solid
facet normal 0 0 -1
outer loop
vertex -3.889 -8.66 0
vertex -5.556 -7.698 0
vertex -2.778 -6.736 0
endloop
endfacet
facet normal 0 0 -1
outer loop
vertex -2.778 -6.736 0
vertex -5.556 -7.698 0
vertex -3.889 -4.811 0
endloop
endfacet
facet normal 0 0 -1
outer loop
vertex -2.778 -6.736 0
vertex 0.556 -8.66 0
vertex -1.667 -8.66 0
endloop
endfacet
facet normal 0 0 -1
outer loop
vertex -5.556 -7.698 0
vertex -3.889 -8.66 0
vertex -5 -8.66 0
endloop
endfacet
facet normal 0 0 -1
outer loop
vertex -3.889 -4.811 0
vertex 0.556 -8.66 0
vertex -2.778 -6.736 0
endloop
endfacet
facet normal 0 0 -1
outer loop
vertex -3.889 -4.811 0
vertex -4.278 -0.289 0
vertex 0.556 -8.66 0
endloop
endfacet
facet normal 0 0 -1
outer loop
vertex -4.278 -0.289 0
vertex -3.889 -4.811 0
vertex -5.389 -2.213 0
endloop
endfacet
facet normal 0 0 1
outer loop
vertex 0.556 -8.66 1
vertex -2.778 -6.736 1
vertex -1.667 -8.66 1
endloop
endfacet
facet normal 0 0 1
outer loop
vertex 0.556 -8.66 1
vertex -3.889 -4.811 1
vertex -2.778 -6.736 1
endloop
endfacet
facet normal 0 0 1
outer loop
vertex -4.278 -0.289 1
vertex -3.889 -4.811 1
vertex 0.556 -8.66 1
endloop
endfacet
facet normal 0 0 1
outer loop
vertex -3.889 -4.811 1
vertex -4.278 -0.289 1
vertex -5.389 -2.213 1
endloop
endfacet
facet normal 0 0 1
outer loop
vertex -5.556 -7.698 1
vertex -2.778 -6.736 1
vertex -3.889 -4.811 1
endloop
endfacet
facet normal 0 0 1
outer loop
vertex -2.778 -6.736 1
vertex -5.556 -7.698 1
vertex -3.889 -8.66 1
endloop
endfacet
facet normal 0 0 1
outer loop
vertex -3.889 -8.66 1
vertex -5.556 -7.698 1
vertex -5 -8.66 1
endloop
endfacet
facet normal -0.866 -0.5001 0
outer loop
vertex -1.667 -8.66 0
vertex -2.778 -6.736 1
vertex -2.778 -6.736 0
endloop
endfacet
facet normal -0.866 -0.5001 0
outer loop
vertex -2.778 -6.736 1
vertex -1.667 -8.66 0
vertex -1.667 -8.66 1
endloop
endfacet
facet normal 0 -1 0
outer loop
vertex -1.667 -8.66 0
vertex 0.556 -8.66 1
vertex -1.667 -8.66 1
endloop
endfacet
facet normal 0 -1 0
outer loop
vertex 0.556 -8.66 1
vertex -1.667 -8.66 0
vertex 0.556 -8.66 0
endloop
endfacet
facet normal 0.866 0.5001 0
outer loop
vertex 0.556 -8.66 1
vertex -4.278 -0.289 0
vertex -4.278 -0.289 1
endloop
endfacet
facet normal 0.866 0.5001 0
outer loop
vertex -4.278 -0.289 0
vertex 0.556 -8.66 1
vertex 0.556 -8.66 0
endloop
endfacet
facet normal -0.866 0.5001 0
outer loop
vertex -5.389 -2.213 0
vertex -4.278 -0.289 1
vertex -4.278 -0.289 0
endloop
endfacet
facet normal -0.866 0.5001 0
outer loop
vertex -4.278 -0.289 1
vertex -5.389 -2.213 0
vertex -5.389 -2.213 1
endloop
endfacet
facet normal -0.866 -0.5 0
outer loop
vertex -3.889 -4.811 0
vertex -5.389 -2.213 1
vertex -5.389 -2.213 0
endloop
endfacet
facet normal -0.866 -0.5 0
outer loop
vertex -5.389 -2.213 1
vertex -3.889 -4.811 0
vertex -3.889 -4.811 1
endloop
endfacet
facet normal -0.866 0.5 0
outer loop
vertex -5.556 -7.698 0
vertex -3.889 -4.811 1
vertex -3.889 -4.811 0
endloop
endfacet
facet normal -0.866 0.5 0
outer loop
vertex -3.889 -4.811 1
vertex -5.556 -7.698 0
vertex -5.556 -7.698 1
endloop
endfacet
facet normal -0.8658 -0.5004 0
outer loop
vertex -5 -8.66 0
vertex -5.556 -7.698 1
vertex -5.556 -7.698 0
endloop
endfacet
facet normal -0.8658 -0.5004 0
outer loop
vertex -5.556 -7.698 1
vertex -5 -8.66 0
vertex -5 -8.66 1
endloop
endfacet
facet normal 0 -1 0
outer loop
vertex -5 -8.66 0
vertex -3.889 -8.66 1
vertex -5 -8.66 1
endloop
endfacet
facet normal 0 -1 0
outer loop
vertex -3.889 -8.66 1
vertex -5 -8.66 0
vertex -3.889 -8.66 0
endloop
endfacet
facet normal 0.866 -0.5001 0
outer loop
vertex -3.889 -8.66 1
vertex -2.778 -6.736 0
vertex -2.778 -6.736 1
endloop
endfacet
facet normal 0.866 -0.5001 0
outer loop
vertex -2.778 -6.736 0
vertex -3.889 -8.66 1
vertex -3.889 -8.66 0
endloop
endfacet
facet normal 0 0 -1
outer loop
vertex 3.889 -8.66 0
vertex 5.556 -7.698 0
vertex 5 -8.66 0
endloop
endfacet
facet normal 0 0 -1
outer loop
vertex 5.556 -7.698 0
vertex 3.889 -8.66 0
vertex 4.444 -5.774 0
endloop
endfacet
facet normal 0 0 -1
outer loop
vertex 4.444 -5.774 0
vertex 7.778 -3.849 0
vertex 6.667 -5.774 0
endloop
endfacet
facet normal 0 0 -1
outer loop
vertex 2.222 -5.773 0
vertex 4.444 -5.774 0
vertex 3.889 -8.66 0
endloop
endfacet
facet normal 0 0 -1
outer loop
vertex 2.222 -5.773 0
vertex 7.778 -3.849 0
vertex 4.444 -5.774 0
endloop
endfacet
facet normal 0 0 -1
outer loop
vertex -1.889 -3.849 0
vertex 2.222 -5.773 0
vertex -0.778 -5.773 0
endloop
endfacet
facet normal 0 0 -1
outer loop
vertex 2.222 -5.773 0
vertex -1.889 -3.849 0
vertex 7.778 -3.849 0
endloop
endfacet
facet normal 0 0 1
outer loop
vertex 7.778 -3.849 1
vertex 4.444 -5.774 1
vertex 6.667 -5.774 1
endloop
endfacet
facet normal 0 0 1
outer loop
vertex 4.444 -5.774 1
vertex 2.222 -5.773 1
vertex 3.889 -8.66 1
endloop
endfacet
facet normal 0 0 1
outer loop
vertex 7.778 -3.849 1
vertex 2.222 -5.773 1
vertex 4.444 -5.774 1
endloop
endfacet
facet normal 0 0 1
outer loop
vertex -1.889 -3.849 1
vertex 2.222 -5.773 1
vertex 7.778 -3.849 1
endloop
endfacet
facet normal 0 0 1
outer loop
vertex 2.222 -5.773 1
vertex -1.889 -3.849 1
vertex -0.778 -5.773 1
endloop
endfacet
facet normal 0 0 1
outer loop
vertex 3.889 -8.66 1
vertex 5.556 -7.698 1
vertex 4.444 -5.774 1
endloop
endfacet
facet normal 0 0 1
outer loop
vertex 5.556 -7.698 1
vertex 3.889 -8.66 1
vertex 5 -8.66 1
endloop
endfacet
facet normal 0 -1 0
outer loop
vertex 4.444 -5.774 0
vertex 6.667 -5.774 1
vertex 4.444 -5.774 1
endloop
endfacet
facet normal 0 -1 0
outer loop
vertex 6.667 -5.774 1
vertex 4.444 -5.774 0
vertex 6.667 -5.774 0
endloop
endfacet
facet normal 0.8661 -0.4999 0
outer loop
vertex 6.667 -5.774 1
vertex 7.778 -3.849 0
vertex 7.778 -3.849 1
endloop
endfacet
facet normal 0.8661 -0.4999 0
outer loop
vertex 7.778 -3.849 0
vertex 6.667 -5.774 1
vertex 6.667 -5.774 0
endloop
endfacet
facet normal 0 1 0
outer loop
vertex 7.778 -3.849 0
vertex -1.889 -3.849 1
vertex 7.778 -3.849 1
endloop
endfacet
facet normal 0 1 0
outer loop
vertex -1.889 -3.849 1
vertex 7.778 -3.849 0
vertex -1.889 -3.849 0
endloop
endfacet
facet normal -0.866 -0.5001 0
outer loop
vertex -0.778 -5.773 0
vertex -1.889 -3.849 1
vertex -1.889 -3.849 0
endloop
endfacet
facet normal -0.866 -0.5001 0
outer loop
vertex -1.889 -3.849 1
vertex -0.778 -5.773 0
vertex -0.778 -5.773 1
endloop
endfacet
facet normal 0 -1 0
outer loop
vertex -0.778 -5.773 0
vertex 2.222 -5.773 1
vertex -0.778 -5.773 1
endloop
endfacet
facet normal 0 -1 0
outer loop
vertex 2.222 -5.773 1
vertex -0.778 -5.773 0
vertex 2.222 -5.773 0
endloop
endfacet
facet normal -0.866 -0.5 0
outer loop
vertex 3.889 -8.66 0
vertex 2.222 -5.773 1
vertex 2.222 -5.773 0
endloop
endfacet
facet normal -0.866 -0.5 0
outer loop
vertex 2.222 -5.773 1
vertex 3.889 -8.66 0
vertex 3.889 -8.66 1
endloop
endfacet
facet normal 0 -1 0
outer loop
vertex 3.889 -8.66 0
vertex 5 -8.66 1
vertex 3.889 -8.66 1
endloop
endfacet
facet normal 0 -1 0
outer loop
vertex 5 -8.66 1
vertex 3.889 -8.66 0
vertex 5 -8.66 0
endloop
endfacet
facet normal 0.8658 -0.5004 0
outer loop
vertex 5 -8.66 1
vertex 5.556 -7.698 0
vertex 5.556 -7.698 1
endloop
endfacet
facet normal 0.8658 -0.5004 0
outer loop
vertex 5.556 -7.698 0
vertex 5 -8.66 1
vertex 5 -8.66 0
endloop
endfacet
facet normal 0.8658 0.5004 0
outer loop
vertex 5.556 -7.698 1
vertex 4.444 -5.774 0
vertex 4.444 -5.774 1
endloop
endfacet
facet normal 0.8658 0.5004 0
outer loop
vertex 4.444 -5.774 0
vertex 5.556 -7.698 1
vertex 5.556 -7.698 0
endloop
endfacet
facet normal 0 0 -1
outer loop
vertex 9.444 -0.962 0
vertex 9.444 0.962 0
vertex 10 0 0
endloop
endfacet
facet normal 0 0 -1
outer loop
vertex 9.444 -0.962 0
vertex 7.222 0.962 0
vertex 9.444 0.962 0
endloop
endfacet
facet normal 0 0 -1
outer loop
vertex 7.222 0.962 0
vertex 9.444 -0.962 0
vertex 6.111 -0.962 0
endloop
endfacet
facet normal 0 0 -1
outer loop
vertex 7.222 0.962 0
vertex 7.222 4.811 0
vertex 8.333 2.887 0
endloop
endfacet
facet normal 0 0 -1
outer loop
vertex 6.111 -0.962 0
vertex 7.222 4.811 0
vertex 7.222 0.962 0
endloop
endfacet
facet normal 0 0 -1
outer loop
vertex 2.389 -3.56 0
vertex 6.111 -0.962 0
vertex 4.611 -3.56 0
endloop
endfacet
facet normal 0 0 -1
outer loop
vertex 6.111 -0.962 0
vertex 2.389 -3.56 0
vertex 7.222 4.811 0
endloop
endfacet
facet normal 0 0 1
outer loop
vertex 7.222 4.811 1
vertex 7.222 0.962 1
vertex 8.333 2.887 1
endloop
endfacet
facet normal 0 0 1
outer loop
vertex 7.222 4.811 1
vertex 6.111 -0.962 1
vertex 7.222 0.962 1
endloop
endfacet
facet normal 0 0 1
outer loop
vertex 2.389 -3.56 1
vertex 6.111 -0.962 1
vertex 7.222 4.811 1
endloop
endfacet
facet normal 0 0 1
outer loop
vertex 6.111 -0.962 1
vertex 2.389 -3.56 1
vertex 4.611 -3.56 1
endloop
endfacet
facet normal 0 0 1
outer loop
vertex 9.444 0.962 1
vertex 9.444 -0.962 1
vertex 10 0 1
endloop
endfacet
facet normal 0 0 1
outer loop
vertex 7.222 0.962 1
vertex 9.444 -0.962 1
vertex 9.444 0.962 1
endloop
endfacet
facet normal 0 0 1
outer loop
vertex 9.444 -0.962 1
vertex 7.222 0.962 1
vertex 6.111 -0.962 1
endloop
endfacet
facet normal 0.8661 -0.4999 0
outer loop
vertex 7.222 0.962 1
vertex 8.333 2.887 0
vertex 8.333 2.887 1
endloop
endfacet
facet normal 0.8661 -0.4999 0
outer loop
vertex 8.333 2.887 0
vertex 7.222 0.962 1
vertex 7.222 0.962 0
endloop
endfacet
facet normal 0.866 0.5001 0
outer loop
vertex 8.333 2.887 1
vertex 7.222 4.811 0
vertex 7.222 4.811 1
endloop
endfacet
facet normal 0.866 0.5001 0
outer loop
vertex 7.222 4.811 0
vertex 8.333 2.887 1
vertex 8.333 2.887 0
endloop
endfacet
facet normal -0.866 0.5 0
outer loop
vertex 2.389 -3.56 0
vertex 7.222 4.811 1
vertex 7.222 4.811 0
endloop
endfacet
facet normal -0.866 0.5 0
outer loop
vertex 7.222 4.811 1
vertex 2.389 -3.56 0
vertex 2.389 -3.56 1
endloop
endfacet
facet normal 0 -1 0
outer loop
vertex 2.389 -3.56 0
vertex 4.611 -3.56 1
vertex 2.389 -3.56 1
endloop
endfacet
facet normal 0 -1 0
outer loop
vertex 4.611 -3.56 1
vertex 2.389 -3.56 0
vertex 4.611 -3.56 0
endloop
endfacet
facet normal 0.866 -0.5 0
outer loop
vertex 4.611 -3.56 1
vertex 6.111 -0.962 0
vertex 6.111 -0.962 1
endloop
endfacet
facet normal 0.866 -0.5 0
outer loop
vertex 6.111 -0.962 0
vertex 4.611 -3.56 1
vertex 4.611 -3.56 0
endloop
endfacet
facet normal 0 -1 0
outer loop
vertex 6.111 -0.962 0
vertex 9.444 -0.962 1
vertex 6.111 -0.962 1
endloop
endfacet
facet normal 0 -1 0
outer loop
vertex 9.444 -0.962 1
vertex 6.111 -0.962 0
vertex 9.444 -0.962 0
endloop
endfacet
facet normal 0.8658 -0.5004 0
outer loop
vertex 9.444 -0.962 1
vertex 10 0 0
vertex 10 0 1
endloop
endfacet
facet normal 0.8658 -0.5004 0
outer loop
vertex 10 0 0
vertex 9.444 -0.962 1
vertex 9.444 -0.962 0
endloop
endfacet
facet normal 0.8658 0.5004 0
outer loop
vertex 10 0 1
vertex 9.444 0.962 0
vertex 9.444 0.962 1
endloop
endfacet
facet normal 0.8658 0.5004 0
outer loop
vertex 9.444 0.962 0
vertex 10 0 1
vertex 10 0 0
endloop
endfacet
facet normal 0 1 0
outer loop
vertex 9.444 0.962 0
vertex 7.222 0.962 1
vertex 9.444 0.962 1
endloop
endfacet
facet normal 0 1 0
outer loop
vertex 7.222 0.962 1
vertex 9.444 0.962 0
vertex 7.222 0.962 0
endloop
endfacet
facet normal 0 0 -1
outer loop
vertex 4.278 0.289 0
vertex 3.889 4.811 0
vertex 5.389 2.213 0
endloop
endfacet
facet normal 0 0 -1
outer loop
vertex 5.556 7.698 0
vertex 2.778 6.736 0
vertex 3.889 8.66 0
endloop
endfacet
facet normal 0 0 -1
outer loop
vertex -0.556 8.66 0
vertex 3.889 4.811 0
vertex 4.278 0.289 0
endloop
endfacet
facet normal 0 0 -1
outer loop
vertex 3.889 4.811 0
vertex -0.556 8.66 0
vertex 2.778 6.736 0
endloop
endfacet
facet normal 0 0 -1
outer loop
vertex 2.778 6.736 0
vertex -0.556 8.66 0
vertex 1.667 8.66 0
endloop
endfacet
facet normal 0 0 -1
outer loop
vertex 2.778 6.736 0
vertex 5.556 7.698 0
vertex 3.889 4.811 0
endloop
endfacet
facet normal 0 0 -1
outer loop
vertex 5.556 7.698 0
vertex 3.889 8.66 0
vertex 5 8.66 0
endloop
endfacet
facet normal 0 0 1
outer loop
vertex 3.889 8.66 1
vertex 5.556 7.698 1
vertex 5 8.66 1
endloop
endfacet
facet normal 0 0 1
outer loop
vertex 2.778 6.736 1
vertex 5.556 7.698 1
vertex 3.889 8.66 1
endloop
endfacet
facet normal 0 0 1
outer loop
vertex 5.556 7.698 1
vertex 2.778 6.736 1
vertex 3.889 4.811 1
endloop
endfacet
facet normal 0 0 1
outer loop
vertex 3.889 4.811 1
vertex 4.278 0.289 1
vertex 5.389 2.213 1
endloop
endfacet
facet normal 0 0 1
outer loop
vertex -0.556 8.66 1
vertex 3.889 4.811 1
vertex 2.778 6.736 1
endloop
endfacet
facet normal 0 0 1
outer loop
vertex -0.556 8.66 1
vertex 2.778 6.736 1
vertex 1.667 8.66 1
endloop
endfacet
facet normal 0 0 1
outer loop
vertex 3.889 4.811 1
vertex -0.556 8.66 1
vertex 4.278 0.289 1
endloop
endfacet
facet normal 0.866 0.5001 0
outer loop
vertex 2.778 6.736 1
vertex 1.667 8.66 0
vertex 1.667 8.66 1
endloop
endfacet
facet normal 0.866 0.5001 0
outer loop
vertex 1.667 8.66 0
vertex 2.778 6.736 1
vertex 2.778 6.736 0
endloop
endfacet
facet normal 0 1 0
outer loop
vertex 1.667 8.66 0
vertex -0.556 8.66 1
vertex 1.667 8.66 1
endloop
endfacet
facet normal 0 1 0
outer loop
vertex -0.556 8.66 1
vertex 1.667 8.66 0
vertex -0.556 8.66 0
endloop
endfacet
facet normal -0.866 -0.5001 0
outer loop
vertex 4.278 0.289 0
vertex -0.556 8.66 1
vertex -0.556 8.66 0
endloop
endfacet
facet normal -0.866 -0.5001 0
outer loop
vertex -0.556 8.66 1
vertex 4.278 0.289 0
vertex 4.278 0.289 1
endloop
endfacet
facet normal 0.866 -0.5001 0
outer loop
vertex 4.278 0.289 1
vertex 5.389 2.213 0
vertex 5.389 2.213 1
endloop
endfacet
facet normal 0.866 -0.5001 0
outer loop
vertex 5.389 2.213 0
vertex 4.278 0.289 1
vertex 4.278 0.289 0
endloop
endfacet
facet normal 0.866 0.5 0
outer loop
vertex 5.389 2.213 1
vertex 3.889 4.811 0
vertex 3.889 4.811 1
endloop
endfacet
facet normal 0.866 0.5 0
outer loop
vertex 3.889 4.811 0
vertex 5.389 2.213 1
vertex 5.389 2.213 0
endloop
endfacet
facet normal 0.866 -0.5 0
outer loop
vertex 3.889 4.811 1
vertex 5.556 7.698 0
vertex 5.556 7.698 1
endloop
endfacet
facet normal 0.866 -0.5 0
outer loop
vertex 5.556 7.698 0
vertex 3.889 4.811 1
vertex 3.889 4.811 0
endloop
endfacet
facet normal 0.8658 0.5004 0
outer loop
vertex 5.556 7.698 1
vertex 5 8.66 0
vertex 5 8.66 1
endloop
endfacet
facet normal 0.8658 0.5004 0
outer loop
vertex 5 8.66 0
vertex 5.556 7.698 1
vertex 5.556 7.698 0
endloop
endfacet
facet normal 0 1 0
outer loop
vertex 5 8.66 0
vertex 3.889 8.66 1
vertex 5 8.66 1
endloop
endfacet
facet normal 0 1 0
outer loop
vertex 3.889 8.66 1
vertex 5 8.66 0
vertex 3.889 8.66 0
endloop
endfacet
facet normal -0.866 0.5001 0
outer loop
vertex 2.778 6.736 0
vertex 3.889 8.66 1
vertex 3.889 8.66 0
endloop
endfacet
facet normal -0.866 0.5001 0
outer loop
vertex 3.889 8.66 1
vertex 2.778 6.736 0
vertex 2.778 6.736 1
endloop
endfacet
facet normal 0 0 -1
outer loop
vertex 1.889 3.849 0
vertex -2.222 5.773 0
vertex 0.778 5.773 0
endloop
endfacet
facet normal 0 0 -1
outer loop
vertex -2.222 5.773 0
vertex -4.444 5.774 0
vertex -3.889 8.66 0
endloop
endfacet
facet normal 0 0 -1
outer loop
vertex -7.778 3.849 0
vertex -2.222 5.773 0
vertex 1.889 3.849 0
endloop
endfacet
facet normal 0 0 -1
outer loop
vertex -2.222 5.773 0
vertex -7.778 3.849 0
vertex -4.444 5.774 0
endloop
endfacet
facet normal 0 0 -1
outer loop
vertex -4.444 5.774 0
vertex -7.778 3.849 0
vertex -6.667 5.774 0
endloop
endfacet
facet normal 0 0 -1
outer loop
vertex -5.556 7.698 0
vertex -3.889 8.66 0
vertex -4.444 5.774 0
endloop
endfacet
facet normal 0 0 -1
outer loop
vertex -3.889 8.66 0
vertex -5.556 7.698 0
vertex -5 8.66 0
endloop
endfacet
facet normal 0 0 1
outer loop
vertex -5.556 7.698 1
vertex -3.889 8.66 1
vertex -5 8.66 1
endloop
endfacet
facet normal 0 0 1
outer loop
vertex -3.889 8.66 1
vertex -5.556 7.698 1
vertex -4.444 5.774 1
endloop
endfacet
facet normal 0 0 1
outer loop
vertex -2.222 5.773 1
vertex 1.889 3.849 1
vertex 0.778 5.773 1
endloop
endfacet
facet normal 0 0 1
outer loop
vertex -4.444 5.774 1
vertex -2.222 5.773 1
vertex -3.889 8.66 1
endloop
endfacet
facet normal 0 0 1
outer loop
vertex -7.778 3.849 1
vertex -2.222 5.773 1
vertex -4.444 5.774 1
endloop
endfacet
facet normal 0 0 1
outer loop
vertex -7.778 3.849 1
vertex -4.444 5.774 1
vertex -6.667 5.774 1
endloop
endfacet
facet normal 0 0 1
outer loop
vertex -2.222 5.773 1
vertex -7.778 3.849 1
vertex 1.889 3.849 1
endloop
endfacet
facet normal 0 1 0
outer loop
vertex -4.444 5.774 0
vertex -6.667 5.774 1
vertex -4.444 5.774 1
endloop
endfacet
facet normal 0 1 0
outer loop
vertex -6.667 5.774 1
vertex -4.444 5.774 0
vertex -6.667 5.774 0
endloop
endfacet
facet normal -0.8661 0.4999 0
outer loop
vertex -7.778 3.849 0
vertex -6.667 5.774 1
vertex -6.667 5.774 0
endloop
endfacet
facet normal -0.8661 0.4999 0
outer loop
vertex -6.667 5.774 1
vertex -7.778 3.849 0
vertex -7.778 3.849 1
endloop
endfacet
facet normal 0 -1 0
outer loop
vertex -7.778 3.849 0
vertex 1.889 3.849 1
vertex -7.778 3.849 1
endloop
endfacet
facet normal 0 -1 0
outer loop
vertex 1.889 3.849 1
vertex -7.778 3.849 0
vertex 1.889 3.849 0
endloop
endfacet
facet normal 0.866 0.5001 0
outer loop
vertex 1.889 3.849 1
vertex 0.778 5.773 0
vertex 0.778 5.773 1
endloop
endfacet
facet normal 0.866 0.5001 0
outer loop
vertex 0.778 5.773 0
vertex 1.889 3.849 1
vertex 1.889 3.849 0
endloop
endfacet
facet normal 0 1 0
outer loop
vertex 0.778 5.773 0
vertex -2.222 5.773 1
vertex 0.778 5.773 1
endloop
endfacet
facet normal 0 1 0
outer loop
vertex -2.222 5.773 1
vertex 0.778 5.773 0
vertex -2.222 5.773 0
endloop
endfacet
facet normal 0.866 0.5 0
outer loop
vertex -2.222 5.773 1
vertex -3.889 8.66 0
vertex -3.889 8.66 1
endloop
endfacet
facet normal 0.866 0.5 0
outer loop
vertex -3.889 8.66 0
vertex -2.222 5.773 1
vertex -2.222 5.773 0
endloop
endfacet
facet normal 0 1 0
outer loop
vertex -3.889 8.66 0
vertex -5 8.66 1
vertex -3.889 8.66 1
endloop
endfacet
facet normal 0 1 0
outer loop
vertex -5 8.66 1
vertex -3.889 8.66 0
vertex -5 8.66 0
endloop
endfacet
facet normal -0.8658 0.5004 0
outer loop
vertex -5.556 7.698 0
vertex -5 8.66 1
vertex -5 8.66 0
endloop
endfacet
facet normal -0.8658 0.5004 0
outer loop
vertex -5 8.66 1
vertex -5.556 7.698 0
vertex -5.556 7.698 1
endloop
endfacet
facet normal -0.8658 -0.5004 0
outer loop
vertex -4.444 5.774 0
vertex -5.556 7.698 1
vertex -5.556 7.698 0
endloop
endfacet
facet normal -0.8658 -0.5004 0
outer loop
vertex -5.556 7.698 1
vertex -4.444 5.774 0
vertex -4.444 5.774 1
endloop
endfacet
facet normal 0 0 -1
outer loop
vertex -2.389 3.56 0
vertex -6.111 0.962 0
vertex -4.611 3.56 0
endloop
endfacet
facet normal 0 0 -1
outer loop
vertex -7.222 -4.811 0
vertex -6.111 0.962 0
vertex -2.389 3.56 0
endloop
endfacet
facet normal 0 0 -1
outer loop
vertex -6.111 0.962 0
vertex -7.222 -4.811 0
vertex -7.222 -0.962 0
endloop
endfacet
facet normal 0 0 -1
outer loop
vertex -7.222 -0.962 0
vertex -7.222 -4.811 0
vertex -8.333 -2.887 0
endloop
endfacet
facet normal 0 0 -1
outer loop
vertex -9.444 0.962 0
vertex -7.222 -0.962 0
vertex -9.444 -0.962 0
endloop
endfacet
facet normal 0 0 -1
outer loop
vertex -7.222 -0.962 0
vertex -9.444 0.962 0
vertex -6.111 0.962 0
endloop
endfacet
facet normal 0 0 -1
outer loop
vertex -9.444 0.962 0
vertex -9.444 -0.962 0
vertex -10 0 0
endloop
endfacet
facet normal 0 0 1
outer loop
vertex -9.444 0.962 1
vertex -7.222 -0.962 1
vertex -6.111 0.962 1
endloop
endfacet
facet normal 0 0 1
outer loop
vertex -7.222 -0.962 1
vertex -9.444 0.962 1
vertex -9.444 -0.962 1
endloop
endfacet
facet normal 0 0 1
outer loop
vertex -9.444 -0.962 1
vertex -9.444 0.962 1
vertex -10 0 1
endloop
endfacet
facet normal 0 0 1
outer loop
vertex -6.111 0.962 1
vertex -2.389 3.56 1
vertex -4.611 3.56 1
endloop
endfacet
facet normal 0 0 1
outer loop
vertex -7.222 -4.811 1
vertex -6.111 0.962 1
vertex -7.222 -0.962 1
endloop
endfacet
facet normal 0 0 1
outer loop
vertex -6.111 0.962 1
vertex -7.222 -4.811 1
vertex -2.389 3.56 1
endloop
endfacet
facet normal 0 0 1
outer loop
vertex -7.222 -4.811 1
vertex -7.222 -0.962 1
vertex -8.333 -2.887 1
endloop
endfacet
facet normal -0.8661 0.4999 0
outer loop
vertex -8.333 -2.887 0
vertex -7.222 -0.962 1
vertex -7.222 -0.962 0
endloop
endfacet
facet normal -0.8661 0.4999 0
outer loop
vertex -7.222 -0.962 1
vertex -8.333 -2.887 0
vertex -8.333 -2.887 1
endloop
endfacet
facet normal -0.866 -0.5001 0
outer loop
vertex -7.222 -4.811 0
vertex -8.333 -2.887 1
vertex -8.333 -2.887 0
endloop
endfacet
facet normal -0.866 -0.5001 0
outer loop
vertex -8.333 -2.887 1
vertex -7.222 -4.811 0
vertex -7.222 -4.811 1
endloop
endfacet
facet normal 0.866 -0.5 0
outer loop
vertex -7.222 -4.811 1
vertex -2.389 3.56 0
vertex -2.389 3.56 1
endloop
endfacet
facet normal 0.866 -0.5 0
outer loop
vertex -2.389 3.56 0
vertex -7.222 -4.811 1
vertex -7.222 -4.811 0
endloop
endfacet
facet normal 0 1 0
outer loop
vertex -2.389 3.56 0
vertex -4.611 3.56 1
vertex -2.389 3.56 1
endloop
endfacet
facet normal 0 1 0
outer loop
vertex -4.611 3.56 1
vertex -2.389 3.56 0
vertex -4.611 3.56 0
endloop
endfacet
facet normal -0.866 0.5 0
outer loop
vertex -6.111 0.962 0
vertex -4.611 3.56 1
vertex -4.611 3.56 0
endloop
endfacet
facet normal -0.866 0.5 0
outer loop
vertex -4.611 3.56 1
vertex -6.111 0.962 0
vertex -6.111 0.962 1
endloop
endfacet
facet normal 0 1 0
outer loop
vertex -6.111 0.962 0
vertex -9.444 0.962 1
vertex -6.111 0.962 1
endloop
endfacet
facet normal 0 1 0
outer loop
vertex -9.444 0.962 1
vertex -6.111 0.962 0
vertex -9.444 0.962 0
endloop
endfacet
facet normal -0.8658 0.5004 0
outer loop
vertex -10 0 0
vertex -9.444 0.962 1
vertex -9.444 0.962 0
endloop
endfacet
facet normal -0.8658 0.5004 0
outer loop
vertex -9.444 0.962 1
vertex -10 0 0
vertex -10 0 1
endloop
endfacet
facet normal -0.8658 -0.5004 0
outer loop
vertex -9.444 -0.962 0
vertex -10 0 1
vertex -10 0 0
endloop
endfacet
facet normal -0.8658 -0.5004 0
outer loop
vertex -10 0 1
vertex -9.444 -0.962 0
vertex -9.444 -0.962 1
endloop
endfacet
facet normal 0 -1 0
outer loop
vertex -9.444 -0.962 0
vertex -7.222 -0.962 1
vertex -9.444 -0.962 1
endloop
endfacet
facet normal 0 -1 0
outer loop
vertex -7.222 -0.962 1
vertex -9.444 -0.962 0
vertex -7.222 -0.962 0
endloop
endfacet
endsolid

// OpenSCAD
// file: parametric-flake.scad
unit = [1, 0];
origin = [0, 0];


/*
    Returns a 2D rotation matrix given an angle.
*/
function rot2d(angle) = [
    [+cos(angle), -sin(angle)],
    [+sin(angle), +cos(angle)]
];


/*
    Calculates the points for a hexagon.
    Used to reference off of for creating the lambda.
    Points are created starting from the right and moving counter-clockwise.

         2   1

      3         0

         4   5
*/
function inner_hex_points(data) = [
    for (angle = [0 : 60 : 300]) 
    dict_get(data, "scale") * rot2d(angle) * unit
];



/*
    Calculates the points for making a lambda.
*/
function lambda_points(data) =
let (
    hex_points = inner_hex_points(data),
    thickness = dict_get(data, "thickness") / 2,
    top_left = hex_points[2],
    bottom_left = hex_points[4],
    bottom_right = hex_points[5],
    v_0 = thickness * unit,
    v_p60 = thickness * rot2d(60) * unit,
    v_n60 = thickness * rot2d(-60) * unit,
    v_n90 = thickness * rot2d(-90) * unit,
    gap = dict_get(data, "gap") * rot2d(-60) * unit
)
[
    [
        top_left + v_p60,
    ],
    [
        top_left - v_p60 + gap,
        top_left + v_p60 + gap,
        bottom_right + v_0,
        bottom_right - v_0,
        sqrt(3) * v_n90,
        bottom_left + v_0,
        bottom_left,
        bottom_left - v_n60,
        -v_0
    ]
];


/*
    Generates a single lambda at the origin.
*/
module lambda(data) {
    new_data = update_params(data);
    linear_extrude(dict_get(new_data, "height"))
    polygon(lambda_points(new_data)[1]);
}


/*
    Generates a NixOS flake.
*/
module flake(data) {
    new_data = update_params(data);
    for (idx = [0 : 5]) {
        rotate([0, 0, idx * 60]) 
        translate(-lambda_points(new_data)[0][0])
        translate([-dict_get(new_data, "scale"), 0, 0])
        linear_extrude(dict_get(new_data, "height"))
        polygon(lambda_points(new_data)[1]);
    }
}


/*
    Returns the value from a associative array/dictionary type structure given some key.

    Values can be of any type.
    The dictionary must of be of the form:
    [
        [ "key0", <value0> ],
        [ "key1", <value1> ],
        ...
    ]
*/
function dict_get(dict, key) =
  dict[search([key], dict)[0]][1];


/*
    Updates the user parameters so the flake is unit size when `scale = 1`.
*/
function update_params(data) = let
    // factor was empirically found. It gives a flake that is circumscribed by the unit circle.
    (factor = 2.25) [
    [ "gap", 0.75 * dict_get(data, "scale") * dict_get(data, "gap") / factor ],
    [ "height", dict_get(data, "height") ],
    [ "scale", dict_get(data, "scale") / factor ],
    [ "thickness", dict_get(data, "scale") * dict_get(data, "thickness") / factor ],
];


/*
    The parameters for generating a NixOS flake.

    `gap` - The gap between lambdas.
    `height` - The z-height of the flake.
    `scale` - The radial (x,y) size of the flake.
    `thickness` - The thickness of the lambda legs.

    `scale` updates `gap` and `thickness` so there is no need to compesate these values.
    A `gap` of 0 will leave no gap between the lambdas.
    A `gap` of 1 will remove the top portion of the long lambda leg until the point where the two lambda legs intersect.

    A `gap` of 0.05 to 0.15 is a good value for replicating the official NixOS flake.
    A `thickness` of 0.5 is a good value for replicating the official NixOS flake.
    OpenSCAD doesn't have a concept of units so use `scale` and `height` values in the desired ratio.
*/
params = [
    [ "gap", 0.1 ],
    [ "height", 1 ],
    [ "scale", 10 ],
    [ "thickness", 0.5 ],
];


flake(params);
// main file
use <parametric-flake.scad>

params = [
    [ "gap", 0.1 ],
    [ "height", 1 ],
    [ "scale", 10 ],
    [ "thickness", 0.5 ],
];

union() {
    flake(params);
}
